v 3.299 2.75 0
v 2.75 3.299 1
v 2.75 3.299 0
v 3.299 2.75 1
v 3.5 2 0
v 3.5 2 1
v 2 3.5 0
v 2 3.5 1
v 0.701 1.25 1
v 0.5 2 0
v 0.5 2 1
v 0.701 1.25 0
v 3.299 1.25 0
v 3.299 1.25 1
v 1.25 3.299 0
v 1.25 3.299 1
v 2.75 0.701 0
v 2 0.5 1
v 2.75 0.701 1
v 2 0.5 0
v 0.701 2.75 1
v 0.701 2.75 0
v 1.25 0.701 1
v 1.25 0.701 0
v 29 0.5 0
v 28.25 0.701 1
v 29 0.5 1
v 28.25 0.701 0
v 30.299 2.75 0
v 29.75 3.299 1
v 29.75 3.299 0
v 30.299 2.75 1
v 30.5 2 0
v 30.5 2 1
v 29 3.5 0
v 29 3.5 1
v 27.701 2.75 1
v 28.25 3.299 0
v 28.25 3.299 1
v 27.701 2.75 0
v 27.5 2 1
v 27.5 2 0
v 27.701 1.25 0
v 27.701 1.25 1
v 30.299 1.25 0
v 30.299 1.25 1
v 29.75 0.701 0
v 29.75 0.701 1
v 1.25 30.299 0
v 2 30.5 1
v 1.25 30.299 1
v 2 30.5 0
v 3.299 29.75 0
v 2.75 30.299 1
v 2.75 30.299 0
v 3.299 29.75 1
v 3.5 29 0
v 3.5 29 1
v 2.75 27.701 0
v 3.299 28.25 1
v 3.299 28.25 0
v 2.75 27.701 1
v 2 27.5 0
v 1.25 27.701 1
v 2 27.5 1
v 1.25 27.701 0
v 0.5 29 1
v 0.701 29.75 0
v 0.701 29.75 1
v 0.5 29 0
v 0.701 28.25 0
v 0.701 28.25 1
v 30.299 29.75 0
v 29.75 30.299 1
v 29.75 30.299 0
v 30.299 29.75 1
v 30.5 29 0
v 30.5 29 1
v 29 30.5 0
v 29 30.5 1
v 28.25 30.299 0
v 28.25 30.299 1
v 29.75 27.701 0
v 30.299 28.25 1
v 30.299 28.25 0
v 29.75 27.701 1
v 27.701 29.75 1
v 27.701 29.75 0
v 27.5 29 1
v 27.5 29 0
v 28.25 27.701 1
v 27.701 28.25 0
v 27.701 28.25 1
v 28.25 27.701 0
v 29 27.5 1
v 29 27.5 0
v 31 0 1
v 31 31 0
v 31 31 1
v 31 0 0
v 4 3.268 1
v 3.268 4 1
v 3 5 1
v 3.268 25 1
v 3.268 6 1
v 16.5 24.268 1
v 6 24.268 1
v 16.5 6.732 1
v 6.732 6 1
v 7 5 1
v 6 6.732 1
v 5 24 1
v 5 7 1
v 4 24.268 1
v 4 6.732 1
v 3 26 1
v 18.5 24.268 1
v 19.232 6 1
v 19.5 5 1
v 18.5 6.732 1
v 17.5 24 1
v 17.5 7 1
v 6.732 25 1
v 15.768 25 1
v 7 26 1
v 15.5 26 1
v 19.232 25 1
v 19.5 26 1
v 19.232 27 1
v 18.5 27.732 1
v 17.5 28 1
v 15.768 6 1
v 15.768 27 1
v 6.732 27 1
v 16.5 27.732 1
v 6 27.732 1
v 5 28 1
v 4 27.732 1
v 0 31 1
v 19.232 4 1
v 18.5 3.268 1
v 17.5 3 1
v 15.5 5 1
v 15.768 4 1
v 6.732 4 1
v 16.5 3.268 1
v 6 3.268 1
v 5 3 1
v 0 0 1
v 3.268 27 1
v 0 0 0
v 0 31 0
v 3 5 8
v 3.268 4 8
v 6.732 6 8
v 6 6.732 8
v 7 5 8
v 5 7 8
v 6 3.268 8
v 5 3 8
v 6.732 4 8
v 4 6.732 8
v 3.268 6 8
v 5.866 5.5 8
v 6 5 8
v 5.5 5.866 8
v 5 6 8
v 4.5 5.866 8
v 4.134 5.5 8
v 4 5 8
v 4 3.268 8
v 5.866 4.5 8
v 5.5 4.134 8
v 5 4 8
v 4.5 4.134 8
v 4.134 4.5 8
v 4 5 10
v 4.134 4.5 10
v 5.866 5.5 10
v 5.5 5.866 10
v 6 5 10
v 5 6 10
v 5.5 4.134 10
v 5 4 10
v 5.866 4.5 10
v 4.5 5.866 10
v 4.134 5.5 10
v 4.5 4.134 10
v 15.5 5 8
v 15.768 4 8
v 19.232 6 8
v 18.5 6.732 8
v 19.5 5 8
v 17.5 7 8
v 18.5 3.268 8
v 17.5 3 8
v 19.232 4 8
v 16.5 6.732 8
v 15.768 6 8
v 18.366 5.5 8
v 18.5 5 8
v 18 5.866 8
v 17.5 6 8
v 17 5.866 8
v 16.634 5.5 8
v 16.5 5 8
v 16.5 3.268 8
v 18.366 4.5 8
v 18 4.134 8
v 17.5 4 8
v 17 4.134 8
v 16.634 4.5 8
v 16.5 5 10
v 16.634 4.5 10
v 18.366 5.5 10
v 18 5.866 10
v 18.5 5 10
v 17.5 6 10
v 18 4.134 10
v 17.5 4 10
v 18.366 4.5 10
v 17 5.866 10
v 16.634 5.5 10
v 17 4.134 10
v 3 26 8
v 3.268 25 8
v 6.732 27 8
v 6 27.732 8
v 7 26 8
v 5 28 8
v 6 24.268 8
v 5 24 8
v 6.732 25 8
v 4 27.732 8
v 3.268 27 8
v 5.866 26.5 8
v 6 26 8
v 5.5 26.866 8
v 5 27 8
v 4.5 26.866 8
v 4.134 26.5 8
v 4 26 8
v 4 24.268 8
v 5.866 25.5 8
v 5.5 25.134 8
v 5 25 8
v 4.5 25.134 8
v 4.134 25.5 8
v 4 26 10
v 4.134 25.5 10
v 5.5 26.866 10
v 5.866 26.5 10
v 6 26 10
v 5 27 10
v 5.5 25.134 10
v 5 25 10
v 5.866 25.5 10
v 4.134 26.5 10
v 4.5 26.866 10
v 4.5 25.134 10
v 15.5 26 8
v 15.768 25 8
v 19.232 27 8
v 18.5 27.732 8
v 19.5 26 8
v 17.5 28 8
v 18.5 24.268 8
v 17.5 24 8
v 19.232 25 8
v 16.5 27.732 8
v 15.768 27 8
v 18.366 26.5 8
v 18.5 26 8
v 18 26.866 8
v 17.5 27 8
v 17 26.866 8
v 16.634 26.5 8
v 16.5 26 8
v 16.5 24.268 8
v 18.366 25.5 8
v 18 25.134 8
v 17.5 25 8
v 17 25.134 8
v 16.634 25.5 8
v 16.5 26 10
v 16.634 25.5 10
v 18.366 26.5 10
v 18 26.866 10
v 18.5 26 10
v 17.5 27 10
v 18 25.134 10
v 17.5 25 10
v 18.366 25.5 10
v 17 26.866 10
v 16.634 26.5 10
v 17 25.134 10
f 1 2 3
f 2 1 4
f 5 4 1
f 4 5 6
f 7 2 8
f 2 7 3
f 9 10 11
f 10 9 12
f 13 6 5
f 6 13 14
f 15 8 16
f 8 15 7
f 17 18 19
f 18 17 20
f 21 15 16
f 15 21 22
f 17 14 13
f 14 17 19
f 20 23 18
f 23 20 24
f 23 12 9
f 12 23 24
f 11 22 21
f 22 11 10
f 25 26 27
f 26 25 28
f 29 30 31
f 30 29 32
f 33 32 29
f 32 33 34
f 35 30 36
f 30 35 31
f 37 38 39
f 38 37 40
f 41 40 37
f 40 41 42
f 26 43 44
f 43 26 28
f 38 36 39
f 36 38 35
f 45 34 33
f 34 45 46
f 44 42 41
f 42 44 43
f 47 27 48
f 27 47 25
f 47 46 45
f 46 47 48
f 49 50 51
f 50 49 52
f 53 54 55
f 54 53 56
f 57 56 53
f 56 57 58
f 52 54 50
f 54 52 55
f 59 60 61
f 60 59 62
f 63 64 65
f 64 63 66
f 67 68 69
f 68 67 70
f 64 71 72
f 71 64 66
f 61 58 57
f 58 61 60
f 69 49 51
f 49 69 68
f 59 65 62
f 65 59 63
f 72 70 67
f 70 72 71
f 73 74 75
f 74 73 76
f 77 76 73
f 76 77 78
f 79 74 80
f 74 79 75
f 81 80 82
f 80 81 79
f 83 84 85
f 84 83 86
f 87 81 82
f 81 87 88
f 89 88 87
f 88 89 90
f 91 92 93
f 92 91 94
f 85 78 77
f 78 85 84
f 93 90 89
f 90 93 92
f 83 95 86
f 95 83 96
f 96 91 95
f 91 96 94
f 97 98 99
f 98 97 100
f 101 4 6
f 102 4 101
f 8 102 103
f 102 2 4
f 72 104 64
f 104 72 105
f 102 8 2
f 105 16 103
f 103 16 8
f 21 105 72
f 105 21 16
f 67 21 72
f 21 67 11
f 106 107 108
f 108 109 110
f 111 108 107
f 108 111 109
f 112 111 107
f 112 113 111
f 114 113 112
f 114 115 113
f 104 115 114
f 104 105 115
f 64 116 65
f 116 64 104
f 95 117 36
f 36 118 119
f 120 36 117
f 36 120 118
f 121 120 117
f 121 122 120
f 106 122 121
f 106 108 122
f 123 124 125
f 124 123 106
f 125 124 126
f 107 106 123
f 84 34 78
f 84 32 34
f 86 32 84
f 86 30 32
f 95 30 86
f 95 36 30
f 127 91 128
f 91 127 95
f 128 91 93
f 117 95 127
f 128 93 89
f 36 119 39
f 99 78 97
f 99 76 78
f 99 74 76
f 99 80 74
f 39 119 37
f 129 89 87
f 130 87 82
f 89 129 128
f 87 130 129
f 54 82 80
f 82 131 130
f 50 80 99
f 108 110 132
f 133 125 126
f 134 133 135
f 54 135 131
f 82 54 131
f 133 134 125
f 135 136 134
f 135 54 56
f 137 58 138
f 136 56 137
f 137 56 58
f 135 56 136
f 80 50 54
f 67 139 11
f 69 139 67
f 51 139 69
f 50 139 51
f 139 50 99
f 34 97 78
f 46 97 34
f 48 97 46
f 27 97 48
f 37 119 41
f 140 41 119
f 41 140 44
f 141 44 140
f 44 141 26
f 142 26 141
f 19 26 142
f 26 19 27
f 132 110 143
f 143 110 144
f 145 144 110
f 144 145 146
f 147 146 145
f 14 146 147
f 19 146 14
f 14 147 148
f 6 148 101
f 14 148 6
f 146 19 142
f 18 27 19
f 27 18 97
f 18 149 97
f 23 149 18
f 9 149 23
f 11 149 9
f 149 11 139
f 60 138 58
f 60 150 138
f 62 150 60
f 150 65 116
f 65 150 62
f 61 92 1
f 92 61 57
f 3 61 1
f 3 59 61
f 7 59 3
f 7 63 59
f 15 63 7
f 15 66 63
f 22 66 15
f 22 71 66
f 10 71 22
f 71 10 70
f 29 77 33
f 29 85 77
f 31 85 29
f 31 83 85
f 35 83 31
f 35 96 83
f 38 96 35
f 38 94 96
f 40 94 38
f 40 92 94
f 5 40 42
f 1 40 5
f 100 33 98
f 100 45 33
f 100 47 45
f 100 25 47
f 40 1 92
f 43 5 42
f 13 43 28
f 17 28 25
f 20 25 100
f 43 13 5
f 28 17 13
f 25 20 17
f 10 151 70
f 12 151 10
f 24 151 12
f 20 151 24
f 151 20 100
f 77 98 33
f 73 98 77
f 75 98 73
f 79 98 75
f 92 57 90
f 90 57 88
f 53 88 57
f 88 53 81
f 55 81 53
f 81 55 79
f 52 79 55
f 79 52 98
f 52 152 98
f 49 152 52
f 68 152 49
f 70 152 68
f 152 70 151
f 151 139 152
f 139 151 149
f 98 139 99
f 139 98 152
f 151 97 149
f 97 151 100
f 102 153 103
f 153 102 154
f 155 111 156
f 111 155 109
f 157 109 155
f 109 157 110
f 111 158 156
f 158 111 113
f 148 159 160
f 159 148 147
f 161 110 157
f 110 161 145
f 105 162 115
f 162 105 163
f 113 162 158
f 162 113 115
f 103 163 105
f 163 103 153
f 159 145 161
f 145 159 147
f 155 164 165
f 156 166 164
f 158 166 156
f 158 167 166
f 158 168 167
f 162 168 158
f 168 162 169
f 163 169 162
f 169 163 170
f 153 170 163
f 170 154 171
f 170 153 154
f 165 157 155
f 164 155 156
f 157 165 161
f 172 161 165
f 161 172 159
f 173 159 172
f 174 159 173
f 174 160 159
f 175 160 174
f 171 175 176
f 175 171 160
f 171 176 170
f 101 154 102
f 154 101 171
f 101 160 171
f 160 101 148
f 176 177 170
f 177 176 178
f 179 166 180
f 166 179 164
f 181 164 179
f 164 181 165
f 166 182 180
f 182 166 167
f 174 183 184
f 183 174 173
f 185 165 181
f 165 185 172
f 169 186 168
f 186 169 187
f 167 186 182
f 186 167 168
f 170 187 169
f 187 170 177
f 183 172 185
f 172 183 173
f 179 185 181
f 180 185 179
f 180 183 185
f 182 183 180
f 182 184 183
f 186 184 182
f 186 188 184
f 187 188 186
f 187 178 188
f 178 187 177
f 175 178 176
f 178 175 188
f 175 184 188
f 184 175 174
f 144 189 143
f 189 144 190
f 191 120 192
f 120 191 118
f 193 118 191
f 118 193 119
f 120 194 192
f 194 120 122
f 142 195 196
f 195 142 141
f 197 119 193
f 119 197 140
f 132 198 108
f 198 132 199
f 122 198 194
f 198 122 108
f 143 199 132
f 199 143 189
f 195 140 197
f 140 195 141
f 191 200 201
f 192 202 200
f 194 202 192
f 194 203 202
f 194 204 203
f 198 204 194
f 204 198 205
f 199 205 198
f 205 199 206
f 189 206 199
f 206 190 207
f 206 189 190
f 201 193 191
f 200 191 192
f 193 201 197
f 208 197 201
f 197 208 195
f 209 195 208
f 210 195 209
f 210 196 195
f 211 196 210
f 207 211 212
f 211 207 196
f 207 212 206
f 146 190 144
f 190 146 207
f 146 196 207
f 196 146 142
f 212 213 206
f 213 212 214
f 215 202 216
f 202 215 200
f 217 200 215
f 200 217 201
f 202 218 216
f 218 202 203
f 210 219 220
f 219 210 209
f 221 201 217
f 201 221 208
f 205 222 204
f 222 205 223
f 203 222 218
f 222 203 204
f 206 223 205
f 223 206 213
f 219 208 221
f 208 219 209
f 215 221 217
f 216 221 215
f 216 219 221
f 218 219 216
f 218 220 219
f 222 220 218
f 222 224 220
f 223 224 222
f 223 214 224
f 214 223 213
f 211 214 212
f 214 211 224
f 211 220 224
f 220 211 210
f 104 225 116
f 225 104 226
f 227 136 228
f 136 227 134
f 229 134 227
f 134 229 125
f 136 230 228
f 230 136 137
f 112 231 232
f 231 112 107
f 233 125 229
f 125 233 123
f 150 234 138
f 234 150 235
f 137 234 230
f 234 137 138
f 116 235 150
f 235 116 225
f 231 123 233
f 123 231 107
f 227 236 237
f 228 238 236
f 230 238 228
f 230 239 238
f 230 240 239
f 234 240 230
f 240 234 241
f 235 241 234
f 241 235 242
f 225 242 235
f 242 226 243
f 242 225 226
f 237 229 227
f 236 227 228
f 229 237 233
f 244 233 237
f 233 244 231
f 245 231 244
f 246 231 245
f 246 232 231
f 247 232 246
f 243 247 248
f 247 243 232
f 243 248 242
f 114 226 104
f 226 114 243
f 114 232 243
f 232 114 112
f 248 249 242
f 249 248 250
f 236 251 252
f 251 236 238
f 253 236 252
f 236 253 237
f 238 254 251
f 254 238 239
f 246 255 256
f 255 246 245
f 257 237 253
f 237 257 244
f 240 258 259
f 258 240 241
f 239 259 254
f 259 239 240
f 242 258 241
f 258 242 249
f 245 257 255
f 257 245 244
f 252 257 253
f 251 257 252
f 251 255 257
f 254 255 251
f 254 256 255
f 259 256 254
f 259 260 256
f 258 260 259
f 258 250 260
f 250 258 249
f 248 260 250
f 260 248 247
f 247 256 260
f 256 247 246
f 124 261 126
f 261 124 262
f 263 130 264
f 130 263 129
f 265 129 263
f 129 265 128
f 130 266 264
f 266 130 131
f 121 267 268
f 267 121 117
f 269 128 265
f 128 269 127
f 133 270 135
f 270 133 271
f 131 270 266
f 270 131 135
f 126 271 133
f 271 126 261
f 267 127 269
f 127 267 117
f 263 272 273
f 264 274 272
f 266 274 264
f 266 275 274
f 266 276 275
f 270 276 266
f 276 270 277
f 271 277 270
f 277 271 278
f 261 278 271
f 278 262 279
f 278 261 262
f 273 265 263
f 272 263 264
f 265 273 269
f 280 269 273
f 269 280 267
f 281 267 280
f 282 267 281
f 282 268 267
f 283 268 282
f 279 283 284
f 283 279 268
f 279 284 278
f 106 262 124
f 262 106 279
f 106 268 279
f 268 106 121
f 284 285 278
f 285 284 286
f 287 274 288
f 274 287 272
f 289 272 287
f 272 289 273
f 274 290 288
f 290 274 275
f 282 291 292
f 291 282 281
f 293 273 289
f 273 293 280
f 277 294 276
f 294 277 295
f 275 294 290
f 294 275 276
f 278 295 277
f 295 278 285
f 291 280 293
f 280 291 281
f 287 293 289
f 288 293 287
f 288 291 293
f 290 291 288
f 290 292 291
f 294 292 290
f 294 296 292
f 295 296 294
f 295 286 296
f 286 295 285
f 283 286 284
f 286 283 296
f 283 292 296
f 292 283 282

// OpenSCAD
$fn=12;

mount_plate_side=31;
mount_plate_thickness=1;
mount_hole_distance=27;
screw_hole_d=3;
column_height=7;
column_screw_d1=2;
column_screw_d2=4;
column_distance1=12.5;
column_distance2=21;

module hole() {
  cylinder(d=screw_hole_d, h=3*mount_plate_thickness);
}

module column() {
  cylinder(d=column_screw_d2, h=column_height);
  translate([0, 0, column_height]) cylinder(d=column_screw_d1, h=2);
}

difference() {
  cube([mount_plate_side, mount_plate_side, mount_plate_thickness]);
  translate([2, 2, -mount_plate_thickness]) {
    hole();
    translate([mount_hole_distance, 0, 0]) hole();
    translate([0, mount_hole_distance, 0]) hole();
    translate([mount_hole_distance, mount_hole_distance, 0]) hole();
  }
}
translate([2+3, 5, mount_plate_thickness]) {
  column();
  translate([column_distance1, 0, 0]) column();
  translate([0, column_distance2, 0]) column();
  translate([column_distance1, column_distance2, 0]) column();
}
